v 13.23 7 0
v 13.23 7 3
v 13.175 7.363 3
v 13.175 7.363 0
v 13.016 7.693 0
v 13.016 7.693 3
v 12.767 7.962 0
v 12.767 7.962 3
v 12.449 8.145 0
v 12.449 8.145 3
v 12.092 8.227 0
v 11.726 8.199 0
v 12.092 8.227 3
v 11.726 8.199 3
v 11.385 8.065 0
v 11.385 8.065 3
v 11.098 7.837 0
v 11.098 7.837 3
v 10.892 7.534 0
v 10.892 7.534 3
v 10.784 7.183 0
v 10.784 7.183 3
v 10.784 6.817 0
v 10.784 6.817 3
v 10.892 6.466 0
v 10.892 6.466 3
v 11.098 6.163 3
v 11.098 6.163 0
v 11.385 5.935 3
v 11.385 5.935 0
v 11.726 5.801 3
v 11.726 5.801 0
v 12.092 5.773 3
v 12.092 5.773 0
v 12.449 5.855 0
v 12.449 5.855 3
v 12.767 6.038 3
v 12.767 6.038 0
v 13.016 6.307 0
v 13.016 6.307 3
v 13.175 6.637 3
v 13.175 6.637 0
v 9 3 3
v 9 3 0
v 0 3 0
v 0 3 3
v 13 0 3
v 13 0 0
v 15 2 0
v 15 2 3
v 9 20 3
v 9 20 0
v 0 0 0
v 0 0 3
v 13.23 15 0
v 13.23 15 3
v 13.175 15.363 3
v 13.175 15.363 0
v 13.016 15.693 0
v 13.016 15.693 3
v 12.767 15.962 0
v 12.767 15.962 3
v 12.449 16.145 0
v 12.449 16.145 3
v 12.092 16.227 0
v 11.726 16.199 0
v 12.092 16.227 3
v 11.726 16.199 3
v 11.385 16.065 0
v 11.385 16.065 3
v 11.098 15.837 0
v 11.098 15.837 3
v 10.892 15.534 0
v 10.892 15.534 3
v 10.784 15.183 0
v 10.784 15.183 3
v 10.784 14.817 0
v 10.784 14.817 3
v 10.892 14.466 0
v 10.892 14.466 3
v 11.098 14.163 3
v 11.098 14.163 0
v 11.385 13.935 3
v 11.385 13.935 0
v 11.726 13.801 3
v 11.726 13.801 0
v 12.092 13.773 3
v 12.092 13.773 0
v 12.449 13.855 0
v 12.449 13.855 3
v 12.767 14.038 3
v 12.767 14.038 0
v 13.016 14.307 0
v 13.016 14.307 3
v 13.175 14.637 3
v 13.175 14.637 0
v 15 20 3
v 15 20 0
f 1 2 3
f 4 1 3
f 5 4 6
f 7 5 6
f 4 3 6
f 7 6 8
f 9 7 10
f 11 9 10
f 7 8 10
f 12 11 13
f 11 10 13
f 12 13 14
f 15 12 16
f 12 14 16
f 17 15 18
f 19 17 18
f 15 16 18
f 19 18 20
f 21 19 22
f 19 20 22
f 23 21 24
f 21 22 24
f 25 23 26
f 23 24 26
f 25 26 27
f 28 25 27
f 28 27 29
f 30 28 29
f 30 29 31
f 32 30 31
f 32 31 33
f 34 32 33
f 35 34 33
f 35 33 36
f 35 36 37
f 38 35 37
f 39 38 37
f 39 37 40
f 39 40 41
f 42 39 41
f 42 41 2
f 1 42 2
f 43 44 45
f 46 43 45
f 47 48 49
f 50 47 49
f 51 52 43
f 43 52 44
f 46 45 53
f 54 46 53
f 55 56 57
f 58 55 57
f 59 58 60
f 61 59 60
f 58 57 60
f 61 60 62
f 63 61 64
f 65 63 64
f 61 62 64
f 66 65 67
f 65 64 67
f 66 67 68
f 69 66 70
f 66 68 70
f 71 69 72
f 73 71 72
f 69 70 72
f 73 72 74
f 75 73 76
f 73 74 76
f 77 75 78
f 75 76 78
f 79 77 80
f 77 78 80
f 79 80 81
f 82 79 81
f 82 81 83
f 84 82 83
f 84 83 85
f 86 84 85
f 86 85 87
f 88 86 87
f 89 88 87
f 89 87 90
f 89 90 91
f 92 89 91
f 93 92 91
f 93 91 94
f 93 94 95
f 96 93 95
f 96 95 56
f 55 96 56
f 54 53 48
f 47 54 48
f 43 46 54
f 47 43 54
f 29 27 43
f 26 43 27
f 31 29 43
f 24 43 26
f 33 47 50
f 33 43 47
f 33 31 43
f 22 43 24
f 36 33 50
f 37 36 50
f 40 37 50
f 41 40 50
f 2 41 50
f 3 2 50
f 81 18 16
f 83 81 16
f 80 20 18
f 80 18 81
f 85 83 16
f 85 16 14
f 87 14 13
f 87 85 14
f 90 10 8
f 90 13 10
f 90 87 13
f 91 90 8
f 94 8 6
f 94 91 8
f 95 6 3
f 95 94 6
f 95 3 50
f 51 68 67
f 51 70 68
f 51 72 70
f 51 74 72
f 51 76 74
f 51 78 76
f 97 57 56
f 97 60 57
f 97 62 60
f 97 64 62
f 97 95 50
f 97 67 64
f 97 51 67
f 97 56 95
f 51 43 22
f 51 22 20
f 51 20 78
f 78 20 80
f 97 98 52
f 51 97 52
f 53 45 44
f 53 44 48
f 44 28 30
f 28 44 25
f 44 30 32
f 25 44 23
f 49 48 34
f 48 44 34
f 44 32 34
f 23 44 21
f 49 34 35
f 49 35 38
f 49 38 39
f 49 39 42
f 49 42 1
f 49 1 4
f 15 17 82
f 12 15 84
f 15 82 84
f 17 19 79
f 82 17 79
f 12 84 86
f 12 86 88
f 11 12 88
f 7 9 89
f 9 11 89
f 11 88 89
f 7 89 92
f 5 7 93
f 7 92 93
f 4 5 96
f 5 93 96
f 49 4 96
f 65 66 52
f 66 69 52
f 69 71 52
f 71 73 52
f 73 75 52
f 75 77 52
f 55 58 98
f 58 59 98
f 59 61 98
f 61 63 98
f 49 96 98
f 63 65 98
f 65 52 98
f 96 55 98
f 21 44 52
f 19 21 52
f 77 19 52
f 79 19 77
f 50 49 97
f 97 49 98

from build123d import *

# Parameters (mm, degrees)
BOSS_EXTRUDE1_DEPTH = 3
SKETCH2_R           = 1.23
CUT_EXTRUDE1_DEPTH  = 4


with BuildPart() as part:
    # Sketch1 → Boss-Extrude1 (new body)
    with BuildSketch(Plane.XY):
        Polygon((0, 0), (13, 0), (15, 2), (15, 20), (9, 20), (9, 3), (0, 3), align=None)
    extrude(amount=BOSS_EXTRUDE1_DEPTH)

    # Sketch2 → Cut-Extrude1 (cut, through all)
    with BuildSketch(Plane.XY.offset(3)):
        with Locations((12, 15)):
            Circle(SKETCH2_R)
        with Locations((12, 7)):
            Circle(SKETCH2_R)
    extrude(amount=-CUT_EXTRUDE1_DEPTH, mode=Mode.SUBTRACT)


solid = part.part
